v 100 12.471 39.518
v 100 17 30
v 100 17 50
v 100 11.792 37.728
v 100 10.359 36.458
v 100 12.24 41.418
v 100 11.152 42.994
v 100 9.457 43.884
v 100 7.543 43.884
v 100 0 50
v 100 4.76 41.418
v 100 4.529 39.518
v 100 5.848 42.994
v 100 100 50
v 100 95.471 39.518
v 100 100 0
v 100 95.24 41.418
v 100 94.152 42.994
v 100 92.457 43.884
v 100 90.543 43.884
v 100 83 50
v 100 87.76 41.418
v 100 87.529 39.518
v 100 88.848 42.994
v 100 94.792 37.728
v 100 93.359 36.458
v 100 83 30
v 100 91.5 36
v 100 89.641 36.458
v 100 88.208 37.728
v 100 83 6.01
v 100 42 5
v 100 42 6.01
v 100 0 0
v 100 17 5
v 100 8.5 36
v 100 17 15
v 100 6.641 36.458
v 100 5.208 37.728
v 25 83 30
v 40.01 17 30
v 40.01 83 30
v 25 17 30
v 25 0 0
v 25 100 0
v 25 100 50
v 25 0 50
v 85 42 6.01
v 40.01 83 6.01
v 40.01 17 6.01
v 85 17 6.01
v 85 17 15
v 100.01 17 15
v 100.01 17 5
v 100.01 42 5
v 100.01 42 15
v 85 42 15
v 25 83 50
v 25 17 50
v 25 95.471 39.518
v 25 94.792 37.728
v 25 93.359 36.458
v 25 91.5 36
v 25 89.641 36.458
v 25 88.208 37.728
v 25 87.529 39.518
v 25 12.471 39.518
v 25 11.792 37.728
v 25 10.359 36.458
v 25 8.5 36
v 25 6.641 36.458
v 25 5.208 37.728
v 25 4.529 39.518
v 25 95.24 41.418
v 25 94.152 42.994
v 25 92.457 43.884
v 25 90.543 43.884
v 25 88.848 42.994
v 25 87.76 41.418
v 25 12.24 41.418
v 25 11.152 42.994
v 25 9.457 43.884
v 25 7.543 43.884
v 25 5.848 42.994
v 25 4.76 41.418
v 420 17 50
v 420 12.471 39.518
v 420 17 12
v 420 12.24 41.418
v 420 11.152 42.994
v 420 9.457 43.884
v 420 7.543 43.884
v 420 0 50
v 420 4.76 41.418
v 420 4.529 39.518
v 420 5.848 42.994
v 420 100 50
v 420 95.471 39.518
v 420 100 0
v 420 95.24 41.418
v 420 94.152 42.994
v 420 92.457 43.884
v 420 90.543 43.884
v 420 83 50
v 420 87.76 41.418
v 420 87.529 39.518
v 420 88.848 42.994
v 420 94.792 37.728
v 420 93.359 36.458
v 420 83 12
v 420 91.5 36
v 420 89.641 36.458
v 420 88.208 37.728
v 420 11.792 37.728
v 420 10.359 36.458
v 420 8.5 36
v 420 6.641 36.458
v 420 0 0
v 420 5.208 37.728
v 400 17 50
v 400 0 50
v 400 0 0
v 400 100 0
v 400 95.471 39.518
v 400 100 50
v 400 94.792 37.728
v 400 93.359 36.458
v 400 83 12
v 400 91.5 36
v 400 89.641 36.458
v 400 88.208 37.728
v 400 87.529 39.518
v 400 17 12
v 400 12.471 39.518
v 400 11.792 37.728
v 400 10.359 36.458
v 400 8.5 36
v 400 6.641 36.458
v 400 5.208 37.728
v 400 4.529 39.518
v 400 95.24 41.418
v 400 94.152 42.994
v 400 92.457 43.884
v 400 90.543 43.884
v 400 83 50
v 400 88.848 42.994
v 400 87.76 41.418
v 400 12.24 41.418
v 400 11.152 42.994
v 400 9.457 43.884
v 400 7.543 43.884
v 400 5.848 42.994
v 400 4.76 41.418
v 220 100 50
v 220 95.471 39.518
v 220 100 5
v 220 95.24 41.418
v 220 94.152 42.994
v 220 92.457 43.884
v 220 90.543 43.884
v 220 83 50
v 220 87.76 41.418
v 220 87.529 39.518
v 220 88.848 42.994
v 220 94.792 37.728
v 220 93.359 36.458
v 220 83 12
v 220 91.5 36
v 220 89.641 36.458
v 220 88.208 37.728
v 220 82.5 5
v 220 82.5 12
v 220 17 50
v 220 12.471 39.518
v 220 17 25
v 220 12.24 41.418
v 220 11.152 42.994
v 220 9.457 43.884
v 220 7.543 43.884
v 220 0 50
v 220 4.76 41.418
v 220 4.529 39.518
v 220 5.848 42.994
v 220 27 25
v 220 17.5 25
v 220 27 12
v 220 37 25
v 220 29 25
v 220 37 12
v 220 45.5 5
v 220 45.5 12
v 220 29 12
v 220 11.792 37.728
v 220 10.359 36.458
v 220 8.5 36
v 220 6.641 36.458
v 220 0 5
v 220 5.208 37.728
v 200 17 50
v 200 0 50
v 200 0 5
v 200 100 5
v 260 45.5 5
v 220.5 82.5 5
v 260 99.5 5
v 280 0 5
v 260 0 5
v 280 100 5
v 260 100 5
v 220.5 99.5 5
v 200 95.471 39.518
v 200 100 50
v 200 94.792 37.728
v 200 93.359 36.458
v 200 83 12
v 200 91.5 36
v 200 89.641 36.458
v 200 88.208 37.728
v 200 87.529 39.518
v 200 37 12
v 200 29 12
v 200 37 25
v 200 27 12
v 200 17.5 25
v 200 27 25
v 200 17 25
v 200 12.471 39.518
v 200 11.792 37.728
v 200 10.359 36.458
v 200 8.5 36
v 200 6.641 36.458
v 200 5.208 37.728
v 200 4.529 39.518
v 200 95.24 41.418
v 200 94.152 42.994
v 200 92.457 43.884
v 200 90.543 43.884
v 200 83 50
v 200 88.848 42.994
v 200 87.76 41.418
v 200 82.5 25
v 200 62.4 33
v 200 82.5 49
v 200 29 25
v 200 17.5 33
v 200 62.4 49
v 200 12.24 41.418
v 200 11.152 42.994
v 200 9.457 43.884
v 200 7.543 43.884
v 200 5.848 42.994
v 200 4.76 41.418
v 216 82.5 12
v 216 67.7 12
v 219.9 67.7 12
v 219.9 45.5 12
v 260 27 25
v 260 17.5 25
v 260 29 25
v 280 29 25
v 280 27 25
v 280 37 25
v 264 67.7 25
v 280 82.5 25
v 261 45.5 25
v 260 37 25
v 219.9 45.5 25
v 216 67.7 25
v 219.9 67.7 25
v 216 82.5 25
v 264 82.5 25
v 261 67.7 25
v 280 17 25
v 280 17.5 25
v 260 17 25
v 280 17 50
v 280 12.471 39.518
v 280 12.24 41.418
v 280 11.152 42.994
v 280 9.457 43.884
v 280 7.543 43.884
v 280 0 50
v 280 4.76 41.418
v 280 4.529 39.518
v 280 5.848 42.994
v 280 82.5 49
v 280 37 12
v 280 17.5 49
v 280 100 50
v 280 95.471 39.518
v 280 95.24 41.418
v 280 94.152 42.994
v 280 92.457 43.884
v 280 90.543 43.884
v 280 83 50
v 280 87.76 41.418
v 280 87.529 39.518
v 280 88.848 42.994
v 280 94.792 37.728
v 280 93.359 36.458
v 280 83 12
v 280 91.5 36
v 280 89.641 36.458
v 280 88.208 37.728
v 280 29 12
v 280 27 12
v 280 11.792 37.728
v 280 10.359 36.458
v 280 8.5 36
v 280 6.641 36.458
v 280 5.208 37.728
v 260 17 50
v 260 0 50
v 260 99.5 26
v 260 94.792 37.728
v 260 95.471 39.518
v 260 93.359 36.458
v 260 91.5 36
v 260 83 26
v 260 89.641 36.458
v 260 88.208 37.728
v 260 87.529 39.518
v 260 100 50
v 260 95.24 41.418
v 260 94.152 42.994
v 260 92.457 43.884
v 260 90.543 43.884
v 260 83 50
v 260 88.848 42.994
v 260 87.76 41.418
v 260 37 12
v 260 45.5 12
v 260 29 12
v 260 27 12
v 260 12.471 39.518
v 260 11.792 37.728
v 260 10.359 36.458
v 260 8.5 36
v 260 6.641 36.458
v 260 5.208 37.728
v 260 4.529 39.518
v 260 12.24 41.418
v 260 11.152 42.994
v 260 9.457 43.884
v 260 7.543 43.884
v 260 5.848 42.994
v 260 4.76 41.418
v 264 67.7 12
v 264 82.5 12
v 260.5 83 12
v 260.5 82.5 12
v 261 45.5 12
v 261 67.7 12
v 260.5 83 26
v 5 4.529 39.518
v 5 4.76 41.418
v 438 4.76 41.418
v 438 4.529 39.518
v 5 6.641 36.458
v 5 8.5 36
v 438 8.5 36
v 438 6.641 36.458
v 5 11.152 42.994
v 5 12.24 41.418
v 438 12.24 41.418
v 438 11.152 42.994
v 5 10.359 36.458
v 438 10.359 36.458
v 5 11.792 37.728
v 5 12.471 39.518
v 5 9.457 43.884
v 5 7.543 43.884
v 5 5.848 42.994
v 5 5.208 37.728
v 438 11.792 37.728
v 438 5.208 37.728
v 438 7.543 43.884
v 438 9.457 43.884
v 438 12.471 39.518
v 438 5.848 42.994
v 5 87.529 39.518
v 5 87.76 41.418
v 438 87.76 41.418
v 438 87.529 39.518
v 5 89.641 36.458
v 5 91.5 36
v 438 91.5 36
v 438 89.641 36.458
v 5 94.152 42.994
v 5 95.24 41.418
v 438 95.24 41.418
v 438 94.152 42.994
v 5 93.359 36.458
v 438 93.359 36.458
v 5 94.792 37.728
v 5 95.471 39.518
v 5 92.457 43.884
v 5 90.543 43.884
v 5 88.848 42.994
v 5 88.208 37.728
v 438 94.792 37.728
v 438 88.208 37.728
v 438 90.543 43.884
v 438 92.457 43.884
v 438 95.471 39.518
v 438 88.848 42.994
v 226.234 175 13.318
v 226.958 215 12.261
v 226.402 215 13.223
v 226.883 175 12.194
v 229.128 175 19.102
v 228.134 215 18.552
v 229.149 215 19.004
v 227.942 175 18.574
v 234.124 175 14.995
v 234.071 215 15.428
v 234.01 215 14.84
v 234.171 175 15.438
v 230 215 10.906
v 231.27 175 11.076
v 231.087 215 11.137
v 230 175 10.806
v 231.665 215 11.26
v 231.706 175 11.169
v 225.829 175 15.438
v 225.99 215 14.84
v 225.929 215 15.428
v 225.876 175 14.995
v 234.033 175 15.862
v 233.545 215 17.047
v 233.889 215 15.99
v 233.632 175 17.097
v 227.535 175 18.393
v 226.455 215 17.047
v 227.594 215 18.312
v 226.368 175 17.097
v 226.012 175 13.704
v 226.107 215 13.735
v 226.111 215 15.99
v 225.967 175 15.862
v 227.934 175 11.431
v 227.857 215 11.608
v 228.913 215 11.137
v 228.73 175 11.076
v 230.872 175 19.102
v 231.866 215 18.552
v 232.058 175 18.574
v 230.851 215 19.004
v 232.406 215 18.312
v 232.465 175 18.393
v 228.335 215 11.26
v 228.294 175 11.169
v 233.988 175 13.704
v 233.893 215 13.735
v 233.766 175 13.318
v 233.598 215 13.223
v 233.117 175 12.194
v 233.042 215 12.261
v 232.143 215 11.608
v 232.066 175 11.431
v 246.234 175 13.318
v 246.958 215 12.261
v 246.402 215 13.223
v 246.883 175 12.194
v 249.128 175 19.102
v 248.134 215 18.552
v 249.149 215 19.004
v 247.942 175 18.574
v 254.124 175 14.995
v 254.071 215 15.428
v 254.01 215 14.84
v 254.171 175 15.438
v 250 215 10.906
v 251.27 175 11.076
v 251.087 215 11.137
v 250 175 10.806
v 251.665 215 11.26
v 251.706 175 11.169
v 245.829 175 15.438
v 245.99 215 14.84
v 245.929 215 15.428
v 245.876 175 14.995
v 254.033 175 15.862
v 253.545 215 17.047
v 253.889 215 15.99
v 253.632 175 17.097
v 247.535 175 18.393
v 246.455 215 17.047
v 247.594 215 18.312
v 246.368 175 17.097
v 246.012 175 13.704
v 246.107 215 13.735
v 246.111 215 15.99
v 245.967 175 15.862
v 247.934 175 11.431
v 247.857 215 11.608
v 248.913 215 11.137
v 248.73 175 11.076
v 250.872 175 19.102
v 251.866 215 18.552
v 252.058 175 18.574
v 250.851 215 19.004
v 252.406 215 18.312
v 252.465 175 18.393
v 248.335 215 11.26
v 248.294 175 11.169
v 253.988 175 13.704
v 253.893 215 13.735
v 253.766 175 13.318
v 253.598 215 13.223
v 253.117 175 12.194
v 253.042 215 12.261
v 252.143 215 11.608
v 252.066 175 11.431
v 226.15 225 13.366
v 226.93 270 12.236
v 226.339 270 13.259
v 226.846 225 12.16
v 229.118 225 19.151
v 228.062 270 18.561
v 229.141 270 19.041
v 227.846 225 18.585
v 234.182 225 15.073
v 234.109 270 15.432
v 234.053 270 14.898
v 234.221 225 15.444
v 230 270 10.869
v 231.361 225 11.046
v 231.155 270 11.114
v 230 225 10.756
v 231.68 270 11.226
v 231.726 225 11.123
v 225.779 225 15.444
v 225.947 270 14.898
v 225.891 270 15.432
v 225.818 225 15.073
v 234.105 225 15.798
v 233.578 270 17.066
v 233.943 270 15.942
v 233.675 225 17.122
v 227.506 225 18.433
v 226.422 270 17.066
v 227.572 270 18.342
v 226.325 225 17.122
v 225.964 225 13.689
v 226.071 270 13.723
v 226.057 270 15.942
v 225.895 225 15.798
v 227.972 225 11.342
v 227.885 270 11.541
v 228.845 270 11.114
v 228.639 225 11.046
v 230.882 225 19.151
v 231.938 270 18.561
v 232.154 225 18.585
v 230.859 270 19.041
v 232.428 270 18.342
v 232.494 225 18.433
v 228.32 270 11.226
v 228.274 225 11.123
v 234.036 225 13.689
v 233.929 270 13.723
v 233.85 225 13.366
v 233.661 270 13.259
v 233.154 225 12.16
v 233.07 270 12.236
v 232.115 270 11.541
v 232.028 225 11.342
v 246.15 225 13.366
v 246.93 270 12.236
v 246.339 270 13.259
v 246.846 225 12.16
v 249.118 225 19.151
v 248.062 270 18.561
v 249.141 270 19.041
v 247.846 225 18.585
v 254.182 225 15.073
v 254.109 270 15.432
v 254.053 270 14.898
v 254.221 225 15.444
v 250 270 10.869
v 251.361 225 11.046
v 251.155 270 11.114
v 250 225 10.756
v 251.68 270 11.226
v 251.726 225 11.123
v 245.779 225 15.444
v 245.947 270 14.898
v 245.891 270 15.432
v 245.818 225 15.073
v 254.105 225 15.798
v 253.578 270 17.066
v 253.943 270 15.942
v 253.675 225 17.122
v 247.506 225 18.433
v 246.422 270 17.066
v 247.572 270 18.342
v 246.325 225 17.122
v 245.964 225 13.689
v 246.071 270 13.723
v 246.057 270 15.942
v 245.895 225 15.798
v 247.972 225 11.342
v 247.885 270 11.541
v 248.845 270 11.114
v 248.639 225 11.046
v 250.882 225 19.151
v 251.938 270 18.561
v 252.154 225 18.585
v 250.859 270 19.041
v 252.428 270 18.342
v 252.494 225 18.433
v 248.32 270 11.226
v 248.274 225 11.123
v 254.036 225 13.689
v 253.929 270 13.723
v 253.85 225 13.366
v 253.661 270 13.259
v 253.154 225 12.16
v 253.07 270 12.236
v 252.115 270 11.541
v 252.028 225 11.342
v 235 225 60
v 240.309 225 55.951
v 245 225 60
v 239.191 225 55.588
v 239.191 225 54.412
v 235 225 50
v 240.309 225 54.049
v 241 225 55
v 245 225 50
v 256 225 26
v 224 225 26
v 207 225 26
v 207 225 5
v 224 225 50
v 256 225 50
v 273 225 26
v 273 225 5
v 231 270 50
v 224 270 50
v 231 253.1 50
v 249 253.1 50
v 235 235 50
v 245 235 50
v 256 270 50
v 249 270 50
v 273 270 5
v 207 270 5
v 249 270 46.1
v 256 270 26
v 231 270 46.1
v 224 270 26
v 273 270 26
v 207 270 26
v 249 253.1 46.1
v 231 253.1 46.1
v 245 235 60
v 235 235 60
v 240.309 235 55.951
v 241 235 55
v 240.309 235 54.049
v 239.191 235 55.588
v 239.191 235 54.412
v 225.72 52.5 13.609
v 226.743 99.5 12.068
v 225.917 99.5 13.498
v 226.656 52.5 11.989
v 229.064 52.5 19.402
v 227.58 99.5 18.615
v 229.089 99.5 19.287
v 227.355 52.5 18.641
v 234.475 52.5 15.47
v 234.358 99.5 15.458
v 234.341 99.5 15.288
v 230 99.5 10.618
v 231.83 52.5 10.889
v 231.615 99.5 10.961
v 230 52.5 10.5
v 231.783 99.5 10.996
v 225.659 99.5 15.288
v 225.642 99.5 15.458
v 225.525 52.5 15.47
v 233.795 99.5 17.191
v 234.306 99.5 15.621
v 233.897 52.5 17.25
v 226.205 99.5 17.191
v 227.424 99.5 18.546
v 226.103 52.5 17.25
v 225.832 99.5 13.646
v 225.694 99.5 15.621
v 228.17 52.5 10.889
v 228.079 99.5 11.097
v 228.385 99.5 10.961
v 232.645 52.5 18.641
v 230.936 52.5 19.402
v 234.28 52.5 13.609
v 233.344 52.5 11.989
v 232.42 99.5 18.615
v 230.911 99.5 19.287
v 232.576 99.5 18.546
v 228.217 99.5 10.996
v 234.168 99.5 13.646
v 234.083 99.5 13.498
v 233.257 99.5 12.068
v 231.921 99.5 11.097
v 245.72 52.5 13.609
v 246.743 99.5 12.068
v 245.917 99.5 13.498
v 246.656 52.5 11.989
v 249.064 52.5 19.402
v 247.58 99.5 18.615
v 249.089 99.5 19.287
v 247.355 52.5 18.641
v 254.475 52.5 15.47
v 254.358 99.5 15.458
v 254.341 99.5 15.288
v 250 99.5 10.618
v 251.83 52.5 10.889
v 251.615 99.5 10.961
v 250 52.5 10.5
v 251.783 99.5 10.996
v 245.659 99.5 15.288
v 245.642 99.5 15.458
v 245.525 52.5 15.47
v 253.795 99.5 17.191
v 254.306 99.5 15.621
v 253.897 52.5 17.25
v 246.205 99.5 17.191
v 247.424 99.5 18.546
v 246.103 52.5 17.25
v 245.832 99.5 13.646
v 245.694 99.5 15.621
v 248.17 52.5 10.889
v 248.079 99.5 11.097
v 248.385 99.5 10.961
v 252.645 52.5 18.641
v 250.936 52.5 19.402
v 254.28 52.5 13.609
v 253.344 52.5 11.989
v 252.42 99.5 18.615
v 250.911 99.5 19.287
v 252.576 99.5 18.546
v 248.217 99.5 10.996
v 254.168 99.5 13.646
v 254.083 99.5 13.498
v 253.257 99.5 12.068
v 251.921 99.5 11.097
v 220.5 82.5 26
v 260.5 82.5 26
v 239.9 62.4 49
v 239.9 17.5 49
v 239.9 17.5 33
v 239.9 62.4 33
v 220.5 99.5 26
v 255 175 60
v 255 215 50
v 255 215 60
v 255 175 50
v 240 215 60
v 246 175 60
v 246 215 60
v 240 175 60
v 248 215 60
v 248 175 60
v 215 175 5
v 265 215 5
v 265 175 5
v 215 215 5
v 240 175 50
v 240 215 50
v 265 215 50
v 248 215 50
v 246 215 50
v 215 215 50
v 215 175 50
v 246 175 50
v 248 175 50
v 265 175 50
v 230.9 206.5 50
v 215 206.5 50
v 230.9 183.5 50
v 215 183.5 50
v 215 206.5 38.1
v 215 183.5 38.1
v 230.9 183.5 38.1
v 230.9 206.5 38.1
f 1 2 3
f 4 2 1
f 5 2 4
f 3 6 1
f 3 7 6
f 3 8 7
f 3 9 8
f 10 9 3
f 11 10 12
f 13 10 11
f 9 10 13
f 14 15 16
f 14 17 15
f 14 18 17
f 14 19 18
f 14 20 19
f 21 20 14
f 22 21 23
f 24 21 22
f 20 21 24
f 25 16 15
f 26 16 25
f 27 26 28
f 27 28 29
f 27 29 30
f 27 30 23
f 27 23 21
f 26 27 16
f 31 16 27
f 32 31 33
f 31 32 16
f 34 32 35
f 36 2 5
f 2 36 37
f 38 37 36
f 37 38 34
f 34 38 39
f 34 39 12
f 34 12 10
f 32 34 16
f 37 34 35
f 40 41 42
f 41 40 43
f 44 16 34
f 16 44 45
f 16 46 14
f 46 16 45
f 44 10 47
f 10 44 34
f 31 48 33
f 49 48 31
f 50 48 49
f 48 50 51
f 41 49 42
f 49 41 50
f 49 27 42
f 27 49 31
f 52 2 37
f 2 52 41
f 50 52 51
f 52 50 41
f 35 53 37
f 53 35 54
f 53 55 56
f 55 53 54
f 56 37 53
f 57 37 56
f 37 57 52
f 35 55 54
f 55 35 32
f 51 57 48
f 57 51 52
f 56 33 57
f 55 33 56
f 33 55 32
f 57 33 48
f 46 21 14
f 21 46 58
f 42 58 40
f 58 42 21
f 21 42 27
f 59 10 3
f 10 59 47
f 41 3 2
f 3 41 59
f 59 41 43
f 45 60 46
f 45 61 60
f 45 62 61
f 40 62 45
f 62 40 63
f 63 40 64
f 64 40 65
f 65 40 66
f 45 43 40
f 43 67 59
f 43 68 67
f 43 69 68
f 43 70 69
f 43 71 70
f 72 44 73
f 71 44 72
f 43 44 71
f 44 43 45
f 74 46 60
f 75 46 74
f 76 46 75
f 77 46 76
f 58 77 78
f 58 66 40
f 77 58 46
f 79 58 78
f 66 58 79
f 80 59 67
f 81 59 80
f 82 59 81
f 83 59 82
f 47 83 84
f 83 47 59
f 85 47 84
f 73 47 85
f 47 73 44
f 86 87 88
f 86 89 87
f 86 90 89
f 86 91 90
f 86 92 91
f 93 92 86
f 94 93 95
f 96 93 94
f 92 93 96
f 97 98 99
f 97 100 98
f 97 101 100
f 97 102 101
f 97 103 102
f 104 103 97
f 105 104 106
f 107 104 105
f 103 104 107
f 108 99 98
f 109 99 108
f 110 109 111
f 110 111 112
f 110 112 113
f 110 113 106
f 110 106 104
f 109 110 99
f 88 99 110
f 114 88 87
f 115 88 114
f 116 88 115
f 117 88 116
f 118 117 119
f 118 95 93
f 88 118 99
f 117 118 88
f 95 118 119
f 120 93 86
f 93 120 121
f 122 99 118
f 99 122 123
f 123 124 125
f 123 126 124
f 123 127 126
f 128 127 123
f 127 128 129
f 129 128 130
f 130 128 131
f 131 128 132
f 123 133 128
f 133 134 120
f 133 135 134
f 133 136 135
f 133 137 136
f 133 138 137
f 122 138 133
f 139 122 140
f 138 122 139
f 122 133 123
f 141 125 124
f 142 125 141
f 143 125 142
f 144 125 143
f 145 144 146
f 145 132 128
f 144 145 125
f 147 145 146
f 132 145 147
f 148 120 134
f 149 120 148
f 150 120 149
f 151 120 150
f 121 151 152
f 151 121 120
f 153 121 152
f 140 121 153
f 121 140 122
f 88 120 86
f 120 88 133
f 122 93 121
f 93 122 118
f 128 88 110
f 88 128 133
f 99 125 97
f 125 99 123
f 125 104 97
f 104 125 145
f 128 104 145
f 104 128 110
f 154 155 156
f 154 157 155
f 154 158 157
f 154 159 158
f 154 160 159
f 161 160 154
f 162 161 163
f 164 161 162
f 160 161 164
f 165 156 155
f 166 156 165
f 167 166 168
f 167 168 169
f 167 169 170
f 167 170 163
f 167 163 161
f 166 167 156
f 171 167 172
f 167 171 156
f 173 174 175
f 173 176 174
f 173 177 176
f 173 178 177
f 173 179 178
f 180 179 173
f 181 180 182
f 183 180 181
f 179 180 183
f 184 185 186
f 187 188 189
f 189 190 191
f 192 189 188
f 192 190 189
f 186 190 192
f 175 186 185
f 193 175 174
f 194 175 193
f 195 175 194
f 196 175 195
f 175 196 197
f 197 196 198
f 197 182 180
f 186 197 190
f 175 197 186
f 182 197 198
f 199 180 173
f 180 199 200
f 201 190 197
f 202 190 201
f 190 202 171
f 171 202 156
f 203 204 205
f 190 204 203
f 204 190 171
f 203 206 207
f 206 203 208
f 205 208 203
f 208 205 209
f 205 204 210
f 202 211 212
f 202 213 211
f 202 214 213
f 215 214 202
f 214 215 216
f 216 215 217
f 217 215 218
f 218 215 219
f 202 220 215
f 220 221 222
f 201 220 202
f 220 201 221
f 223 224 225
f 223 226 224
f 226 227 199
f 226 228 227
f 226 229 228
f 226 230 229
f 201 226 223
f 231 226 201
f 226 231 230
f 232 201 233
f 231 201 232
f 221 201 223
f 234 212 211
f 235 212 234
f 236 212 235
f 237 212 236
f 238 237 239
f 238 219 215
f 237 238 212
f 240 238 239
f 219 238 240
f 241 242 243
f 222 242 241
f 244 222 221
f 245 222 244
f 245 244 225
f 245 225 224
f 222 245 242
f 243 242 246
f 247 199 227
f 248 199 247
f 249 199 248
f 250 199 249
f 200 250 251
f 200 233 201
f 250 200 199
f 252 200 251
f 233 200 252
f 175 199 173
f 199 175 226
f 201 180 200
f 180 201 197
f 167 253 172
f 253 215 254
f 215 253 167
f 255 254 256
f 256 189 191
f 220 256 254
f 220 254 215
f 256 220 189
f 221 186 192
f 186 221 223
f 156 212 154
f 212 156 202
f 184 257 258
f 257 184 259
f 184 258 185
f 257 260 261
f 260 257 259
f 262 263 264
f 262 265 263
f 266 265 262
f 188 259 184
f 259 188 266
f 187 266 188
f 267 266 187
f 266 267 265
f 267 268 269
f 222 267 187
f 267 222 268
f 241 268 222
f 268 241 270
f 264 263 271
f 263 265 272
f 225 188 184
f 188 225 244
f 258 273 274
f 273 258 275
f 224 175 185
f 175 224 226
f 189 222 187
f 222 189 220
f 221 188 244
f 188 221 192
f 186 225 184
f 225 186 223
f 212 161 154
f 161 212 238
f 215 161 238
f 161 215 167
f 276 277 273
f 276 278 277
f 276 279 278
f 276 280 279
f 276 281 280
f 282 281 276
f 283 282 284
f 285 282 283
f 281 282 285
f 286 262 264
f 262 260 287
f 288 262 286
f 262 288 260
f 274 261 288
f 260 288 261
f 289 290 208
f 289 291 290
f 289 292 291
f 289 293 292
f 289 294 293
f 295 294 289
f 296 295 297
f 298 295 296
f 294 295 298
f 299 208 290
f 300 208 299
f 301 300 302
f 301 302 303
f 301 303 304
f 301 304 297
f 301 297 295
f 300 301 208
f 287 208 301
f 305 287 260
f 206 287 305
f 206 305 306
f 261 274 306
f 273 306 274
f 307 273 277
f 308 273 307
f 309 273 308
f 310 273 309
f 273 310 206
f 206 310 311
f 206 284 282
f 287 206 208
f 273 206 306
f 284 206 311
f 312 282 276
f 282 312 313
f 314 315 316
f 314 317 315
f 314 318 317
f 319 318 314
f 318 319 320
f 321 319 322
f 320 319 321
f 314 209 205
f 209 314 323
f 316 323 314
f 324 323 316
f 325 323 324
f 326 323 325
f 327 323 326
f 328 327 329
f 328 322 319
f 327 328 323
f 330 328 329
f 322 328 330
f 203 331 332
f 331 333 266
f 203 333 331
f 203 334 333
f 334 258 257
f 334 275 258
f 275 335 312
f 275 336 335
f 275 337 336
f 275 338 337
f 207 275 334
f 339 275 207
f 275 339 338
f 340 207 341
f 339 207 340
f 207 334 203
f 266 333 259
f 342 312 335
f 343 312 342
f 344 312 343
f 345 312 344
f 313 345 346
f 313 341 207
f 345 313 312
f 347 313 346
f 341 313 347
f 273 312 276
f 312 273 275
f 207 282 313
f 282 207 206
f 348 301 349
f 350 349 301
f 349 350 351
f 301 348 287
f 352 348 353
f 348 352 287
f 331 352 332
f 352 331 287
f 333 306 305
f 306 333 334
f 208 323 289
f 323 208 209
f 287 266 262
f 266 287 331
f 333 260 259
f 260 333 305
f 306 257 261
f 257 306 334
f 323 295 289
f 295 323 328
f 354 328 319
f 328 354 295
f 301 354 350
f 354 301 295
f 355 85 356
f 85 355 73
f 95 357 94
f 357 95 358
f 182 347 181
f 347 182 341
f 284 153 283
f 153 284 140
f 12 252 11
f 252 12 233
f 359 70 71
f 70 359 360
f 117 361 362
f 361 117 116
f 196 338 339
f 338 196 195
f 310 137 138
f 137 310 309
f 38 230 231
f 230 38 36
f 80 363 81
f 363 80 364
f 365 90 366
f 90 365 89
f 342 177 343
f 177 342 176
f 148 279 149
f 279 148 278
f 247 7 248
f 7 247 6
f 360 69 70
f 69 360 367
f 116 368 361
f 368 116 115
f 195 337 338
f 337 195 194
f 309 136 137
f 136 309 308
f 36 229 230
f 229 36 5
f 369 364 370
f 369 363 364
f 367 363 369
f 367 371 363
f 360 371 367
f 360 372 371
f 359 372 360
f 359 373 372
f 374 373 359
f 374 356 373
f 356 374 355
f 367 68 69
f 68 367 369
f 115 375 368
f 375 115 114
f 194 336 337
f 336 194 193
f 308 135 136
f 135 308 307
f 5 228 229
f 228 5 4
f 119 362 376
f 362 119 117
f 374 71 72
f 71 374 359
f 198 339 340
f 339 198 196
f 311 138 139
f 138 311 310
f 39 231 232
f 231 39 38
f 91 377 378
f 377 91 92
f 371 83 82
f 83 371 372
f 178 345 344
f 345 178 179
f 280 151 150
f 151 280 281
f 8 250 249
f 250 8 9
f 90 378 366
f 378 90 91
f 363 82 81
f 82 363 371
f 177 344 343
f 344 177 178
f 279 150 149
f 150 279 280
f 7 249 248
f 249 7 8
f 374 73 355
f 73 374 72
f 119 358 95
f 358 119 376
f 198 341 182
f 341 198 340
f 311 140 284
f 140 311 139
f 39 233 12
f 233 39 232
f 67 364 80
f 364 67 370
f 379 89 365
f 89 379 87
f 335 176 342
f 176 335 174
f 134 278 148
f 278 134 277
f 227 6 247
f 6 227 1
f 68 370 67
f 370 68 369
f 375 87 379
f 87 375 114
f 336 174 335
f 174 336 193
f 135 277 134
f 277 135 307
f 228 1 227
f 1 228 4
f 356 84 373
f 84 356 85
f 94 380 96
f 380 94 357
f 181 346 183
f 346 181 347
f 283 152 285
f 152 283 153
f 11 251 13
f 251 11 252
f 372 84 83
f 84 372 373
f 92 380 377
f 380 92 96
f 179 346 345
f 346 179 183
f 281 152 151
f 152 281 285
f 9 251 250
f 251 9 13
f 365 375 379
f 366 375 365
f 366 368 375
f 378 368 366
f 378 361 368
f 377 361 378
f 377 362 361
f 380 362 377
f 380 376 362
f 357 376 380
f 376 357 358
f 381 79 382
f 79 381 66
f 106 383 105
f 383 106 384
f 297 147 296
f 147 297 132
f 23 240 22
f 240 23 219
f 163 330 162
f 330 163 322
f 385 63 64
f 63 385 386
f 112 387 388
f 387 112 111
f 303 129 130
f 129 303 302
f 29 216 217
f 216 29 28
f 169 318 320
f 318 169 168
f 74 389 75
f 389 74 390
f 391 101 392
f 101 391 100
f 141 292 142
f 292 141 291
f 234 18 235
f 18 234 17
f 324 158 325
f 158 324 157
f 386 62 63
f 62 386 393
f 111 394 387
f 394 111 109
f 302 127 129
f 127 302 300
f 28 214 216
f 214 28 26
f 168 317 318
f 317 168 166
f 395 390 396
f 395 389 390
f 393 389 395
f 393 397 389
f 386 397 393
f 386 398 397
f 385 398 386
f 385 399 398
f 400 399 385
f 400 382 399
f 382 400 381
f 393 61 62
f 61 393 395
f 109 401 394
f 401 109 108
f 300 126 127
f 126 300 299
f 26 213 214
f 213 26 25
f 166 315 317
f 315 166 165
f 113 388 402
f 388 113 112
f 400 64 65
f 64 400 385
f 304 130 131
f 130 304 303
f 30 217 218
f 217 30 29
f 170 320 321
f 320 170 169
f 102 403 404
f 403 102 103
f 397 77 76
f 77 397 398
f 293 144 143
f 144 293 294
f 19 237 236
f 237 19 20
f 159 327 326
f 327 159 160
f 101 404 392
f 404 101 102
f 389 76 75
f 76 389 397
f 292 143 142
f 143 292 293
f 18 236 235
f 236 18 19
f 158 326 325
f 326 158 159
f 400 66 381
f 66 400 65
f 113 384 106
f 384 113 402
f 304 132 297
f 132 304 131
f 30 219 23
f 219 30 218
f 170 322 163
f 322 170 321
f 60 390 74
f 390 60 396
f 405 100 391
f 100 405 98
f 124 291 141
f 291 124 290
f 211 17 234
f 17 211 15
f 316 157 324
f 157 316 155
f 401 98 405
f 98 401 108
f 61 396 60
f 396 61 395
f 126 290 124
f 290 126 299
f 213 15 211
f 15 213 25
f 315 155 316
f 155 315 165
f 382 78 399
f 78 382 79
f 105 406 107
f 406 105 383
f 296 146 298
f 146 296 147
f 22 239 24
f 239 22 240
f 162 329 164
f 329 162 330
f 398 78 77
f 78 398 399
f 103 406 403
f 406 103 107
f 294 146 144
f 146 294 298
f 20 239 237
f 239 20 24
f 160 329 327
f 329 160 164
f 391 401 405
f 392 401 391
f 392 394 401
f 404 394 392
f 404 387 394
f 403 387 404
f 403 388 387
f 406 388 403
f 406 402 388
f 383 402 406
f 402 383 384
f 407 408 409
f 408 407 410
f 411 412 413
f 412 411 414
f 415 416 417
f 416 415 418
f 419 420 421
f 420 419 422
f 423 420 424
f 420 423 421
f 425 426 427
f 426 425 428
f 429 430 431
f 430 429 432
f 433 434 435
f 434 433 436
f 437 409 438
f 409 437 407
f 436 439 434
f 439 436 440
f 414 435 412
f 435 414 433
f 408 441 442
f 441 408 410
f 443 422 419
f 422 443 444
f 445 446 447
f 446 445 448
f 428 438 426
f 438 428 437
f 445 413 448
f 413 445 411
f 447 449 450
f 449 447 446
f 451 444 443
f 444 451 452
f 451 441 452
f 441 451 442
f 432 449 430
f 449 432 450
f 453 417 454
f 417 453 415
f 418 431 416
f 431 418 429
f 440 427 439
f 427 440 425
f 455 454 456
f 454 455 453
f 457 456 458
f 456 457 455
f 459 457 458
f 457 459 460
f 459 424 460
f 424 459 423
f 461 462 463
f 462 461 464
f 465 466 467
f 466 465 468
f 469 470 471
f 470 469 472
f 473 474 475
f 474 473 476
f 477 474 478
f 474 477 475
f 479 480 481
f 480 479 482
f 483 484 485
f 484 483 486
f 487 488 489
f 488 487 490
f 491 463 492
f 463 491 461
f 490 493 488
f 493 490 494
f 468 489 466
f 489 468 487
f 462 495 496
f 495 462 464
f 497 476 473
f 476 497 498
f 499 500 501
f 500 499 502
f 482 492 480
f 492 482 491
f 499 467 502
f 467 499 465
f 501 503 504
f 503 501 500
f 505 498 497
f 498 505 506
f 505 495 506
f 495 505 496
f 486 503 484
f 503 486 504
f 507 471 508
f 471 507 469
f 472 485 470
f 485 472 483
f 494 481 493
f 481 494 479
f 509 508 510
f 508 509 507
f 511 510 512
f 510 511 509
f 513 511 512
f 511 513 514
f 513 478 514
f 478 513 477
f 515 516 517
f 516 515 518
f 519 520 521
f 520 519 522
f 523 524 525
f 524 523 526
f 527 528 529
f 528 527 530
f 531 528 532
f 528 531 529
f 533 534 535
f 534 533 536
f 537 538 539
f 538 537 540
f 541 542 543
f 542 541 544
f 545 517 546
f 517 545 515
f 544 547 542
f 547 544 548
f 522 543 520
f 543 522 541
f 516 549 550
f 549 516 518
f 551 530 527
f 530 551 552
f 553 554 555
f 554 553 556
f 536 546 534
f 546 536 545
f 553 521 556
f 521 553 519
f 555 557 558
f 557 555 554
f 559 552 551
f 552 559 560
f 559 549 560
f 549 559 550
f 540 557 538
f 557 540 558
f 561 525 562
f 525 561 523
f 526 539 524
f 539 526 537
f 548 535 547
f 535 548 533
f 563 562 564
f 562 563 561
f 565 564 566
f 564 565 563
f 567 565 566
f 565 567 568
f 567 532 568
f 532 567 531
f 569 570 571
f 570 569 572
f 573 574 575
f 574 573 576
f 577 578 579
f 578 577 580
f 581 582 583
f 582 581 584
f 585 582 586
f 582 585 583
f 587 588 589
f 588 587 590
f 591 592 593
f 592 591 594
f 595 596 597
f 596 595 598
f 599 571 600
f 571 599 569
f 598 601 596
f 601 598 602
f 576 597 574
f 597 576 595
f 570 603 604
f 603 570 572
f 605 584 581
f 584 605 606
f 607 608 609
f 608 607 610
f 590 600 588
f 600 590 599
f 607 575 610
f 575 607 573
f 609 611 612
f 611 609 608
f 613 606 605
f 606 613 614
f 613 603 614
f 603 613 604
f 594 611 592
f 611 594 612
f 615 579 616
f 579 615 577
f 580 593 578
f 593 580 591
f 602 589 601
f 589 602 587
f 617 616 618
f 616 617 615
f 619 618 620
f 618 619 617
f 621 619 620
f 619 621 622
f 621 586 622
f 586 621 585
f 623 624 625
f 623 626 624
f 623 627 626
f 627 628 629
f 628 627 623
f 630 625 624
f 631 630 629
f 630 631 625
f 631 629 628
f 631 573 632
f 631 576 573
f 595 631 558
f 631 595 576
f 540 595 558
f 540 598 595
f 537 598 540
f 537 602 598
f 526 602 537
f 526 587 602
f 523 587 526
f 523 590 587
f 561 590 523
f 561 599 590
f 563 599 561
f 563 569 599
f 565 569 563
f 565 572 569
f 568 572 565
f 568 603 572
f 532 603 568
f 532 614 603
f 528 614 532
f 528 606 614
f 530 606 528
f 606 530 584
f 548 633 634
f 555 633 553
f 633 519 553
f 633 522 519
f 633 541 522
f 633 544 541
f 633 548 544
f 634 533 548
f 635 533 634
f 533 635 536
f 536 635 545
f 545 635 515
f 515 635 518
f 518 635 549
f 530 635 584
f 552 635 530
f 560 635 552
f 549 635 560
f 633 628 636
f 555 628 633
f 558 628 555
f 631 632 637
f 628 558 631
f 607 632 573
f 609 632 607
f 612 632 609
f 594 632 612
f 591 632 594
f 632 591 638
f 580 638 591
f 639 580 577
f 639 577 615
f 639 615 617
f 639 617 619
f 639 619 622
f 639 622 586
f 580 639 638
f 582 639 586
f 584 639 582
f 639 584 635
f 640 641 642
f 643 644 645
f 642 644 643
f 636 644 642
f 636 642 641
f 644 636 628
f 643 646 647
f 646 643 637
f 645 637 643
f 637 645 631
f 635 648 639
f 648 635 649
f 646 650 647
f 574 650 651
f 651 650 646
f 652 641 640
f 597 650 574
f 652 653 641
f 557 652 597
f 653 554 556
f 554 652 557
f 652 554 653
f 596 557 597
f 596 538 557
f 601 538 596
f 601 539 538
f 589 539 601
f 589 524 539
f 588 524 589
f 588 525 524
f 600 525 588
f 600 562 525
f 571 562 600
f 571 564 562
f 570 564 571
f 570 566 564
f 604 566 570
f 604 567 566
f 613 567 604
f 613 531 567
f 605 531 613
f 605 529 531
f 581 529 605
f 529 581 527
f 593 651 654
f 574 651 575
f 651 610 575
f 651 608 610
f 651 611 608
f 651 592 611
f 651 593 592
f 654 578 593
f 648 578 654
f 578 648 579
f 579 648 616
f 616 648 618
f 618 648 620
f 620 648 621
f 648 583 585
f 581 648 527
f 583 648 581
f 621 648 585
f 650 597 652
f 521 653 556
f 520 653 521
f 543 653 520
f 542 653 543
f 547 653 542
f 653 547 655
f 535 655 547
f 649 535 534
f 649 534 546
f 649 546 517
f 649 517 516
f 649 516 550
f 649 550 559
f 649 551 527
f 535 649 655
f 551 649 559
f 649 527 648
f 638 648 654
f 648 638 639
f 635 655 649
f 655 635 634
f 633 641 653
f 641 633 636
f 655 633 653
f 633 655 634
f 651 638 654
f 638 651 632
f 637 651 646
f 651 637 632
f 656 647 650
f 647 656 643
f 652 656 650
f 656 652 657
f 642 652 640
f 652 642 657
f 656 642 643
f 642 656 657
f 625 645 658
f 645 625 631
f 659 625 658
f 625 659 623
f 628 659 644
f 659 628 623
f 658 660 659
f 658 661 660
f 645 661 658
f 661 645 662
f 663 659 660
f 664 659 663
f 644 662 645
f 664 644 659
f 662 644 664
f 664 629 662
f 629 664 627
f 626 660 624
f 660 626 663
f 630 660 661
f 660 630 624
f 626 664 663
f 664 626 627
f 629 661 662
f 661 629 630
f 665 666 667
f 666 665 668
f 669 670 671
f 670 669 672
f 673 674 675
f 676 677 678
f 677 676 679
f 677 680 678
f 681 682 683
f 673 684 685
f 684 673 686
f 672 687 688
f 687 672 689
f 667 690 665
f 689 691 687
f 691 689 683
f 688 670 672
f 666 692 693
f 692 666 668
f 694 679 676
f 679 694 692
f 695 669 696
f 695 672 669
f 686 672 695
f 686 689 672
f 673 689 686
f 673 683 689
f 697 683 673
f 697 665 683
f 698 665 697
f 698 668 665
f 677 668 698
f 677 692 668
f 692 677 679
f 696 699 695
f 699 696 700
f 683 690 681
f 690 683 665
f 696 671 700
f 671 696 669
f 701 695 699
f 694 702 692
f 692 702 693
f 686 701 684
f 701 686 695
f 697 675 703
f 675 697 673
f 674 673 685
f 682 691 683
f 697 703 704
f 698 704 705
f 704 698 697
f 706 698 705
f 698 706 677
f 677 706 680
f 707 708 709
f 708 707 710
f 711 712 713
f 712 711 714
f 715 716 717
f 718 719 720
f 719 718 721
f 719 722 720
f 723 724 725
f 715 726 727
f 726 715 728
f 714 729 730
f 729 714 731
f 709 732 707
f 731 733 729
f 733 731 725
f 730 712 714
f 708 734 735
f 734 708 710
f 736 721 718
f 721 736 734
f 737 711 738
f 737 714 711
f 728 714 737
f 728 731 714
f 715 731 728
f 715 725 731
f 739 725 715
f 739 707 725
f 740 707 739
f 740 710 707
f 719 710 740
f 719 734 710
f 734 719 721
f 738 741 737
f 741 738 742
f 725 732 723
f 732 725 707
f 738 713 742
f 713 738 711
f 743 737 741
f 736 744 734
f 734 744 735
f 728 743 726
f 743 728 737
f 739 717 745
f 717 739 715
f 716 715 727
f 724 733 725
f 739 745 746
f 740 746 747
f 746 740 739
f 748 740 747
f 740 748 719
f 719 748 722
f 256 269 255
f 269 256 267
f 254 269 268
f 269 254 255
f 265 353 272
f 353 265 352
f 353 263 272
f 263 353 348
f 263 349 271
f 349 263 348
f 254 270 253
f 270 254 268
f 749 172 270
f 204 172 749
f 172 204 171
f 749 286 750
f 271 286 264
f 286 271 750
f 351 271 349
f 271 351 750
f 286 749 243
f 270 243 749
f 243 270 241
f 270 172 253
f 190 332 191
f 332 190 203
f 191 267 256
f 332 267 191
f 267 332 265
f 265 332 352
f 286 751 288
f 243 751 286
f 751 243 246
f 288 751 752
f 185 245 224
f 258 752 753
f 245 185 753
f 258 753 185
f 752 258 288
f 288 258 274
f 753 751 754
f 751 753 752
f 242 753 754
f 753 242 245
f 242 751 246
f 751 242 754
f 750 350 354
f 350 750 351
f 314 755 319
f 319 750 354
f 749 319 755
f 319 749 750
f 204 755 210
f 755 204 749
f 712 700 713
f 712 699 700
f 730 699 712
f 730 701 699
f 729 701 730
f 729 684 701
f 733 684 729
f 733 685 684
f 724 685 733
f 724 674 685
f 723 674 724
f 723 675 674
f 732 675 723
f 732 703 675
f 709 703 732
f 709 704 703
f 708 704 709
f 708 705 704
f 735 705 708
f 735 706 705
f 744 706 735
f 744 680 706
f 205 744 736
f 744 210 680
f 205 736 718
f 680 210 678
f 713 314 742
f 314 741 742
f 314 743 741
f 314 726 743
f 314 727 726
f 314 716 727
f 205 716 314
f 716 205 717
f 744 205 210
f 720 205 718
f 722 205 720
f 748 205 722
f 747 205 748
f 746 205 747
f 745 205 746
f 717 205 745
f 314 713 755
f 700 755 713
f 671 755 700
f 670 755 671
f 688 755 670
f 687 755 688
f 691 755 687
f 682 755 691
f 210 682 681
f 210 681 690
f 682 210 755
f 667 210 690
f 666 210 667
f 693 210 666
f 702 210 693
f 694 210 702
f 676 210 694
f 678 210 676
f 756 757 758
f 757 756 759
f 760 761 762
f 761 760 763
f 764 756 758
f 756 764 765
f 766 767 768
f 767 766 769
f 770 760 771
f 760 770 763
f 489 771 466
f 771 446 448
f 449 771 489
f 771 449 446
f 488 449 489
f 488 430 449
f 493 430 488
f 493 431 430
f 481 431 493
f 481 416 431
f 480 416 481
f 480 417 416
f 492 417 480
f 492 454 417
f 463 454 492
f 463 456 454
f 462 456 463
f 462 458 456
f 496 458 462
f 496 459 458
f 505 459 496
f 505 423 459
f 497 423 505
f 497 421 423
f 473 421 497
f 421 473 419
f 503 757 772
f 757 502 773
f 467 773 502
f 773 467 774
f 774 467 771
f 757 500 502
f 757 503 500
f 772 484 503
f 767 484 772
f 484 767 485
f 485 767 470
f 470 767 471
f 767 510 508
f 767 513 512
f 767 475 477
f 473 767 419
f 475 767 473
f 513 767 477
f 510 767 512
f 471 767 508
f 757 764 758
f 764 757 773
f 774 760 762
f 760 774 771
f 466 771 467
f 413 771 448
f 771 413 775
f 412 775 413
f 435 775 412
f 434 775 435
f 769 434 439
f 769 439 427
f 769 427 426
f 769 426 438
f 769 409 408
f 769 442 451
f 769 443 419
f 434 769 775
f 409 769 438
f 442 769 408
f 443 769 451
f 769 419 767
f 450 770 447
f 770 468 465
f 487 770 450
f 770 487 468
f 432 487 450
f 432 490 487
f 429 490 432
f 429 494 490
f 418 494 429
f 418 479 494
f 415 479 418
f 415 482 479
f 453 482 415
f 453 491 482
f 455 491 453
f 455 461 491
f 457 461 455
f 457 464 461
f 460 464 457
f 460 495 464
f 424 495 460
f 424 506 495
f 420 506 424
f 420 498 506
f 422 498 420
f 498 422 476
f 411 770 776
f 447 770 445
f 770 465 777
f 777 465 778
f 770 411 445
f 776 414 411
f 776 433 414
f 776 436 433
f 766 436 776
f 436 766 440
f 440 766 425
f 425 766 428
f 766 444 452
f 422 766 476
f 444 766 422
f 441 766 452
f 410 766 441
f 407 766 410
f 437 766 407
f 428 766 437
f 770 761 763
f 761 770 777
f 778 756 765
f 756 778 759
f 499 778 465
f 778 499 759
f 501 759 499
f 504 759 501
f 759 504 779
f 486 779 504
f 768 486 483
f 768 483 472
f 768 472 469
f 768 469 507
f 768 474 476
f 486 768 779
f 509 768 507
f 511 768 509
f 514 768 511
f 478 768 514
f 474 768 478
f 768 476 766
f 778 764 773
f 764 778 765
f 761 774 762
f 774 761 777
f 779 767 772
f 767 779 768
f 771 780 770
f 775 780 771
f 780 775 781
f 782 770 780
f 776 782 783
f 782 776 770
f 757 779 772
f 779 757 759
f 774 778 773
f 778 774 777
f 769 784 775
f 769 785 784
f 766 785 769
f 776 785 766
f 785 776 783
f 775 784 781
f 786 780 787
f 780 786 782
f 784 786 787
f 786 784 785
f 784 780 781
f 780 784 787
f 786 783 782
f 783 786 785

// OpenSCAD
// file: FirstAxis.scad
module motorBracket() {
    difference() {
    cube([100,100,30]);
    
    translate([40.01,17,6.01]) {
    cube([60,66,24]);
    }
    }
    translate([85,17,5]) {cube([15.01,25,10]);}
    translate([0,83,30]) { cube([100,17,20]);}
    translate([0,0,30]) { cube([100,17,20]);}
}
module rod() {
    cylinder(433,4,4,true);
}
module rod2() {
    cylinder(400,3.5,4.5,true);
}



module endBracket() {
translate([400,0,0]) { cube([20,17,50]);cube([20,100,12]);}
translate([400,83,0]) { cube([20,17,50]);}
translate([400,0,0]) { cube([00,100,30]); }
}


module carridge() {
    translate([200,0,5]) { cube([20,17,45]);cube([20,100,7]);}
    translate([200,83,5]) { cube([20,17,45]);}
    translate([200,0,0]) { cube([00,100,30]); }
    difference() { 
    translate([200,17,5]) {cube([20,20,20]);}
    translate([199,27,5]) {cube([22,2,21]);}
    }
}

module firstAxis() {
difference() {
    motorBracket();
    translate([-35,-10,-20]) { cube([60,120,80]);}
}
//216.5 is the edge of the mount
translate([221.5,8.5,40]) { rotate([0,90,0]) { rod(); } }
translate([221.5,91.5,40]) { rotate([0,90,0]) { rod(); } }

endBracket();
carridge();
translate([60,0,0]) { carridge(); }
}
// main file
include <FirstAxis.scad>

//secondEnd();
module secondEnd() {
    difference() {
    rotate([0,0,270]) {
        translate([-200,207,5]) { cube([45,66,45]);}
        
    }
    translate([199,149,26]) { cube([25,55,35]);}
    translate([256,149,26]) { cube([25,55,35]);}   
    translate([200,17.5,25]) { m2rod();}
    translate([231,183.1,46.1]) { cube([18,17,4]);}   
    }
    difference() {
    translate([235,155,5]) {cube([10,10,55]);}   
    translate([240,155,55]) {rotate([90,0,0]) {cylinder(120,1,1,true);}}
    }
    
    
}

module motorMount2() {
    translate([16,0,-20]) {
        difference() {
        cube([48,65,20]);
            translate([-0.1,50.1,-0.1]) {
                cube([4,15,7]);
                translate([00,-50.5,0]) {cube([4,50.6,21]); }
            }
            translate([45,50.1,-0.1]) {
                cube([4,15,7]);
                translate([00,-50.5,0]) {cube([4,50.6,21]); }
            }            
            translate([3.5,-1,-1]) { cube([43,29,21]);} 

        }
    }
    translate([20.5,53,-20]) { cube([40,29,21]);} 
        
    difference() {
    cube([80,65,24]);
        translate([-0.1,-0.1,8]) {
        cube([40,45,17]);}
    }
}

module m2rod() {
        translate([30,235,-10]) { rotate([90,90,0]) { rod2(); } }
    translate([50,235,-10]) { rotate([90,90,0]) { rod2(); } }
}

module otherCarridge() {
    difference() {
        translate([215,175,5]) {
            cube([50,40,45]); 
            translate([25,0,0]) { 
                difference() {
                    cube([15,40,55]); 
                    translate([6,-1,1]) { cube([2,50,55]); }
                }
            }
        }
        translate([214.9,183.5,38.1]) {color([1,0,0]) {
        cube([16,23,12]);
        }}
        
        translate([200,17.5,25]) { m2rod();}
        translate([200,17.5,25]) { m2rod();}
    }
    
    
}



 firstAxis();

color([1,0,0]) {
translate([0,70,0]) {secondEnd();}

translate([200,17.5,25]) {
   difference() {
       motorMount2();
       m2rod();
       }

}
}


otherCarridge();
